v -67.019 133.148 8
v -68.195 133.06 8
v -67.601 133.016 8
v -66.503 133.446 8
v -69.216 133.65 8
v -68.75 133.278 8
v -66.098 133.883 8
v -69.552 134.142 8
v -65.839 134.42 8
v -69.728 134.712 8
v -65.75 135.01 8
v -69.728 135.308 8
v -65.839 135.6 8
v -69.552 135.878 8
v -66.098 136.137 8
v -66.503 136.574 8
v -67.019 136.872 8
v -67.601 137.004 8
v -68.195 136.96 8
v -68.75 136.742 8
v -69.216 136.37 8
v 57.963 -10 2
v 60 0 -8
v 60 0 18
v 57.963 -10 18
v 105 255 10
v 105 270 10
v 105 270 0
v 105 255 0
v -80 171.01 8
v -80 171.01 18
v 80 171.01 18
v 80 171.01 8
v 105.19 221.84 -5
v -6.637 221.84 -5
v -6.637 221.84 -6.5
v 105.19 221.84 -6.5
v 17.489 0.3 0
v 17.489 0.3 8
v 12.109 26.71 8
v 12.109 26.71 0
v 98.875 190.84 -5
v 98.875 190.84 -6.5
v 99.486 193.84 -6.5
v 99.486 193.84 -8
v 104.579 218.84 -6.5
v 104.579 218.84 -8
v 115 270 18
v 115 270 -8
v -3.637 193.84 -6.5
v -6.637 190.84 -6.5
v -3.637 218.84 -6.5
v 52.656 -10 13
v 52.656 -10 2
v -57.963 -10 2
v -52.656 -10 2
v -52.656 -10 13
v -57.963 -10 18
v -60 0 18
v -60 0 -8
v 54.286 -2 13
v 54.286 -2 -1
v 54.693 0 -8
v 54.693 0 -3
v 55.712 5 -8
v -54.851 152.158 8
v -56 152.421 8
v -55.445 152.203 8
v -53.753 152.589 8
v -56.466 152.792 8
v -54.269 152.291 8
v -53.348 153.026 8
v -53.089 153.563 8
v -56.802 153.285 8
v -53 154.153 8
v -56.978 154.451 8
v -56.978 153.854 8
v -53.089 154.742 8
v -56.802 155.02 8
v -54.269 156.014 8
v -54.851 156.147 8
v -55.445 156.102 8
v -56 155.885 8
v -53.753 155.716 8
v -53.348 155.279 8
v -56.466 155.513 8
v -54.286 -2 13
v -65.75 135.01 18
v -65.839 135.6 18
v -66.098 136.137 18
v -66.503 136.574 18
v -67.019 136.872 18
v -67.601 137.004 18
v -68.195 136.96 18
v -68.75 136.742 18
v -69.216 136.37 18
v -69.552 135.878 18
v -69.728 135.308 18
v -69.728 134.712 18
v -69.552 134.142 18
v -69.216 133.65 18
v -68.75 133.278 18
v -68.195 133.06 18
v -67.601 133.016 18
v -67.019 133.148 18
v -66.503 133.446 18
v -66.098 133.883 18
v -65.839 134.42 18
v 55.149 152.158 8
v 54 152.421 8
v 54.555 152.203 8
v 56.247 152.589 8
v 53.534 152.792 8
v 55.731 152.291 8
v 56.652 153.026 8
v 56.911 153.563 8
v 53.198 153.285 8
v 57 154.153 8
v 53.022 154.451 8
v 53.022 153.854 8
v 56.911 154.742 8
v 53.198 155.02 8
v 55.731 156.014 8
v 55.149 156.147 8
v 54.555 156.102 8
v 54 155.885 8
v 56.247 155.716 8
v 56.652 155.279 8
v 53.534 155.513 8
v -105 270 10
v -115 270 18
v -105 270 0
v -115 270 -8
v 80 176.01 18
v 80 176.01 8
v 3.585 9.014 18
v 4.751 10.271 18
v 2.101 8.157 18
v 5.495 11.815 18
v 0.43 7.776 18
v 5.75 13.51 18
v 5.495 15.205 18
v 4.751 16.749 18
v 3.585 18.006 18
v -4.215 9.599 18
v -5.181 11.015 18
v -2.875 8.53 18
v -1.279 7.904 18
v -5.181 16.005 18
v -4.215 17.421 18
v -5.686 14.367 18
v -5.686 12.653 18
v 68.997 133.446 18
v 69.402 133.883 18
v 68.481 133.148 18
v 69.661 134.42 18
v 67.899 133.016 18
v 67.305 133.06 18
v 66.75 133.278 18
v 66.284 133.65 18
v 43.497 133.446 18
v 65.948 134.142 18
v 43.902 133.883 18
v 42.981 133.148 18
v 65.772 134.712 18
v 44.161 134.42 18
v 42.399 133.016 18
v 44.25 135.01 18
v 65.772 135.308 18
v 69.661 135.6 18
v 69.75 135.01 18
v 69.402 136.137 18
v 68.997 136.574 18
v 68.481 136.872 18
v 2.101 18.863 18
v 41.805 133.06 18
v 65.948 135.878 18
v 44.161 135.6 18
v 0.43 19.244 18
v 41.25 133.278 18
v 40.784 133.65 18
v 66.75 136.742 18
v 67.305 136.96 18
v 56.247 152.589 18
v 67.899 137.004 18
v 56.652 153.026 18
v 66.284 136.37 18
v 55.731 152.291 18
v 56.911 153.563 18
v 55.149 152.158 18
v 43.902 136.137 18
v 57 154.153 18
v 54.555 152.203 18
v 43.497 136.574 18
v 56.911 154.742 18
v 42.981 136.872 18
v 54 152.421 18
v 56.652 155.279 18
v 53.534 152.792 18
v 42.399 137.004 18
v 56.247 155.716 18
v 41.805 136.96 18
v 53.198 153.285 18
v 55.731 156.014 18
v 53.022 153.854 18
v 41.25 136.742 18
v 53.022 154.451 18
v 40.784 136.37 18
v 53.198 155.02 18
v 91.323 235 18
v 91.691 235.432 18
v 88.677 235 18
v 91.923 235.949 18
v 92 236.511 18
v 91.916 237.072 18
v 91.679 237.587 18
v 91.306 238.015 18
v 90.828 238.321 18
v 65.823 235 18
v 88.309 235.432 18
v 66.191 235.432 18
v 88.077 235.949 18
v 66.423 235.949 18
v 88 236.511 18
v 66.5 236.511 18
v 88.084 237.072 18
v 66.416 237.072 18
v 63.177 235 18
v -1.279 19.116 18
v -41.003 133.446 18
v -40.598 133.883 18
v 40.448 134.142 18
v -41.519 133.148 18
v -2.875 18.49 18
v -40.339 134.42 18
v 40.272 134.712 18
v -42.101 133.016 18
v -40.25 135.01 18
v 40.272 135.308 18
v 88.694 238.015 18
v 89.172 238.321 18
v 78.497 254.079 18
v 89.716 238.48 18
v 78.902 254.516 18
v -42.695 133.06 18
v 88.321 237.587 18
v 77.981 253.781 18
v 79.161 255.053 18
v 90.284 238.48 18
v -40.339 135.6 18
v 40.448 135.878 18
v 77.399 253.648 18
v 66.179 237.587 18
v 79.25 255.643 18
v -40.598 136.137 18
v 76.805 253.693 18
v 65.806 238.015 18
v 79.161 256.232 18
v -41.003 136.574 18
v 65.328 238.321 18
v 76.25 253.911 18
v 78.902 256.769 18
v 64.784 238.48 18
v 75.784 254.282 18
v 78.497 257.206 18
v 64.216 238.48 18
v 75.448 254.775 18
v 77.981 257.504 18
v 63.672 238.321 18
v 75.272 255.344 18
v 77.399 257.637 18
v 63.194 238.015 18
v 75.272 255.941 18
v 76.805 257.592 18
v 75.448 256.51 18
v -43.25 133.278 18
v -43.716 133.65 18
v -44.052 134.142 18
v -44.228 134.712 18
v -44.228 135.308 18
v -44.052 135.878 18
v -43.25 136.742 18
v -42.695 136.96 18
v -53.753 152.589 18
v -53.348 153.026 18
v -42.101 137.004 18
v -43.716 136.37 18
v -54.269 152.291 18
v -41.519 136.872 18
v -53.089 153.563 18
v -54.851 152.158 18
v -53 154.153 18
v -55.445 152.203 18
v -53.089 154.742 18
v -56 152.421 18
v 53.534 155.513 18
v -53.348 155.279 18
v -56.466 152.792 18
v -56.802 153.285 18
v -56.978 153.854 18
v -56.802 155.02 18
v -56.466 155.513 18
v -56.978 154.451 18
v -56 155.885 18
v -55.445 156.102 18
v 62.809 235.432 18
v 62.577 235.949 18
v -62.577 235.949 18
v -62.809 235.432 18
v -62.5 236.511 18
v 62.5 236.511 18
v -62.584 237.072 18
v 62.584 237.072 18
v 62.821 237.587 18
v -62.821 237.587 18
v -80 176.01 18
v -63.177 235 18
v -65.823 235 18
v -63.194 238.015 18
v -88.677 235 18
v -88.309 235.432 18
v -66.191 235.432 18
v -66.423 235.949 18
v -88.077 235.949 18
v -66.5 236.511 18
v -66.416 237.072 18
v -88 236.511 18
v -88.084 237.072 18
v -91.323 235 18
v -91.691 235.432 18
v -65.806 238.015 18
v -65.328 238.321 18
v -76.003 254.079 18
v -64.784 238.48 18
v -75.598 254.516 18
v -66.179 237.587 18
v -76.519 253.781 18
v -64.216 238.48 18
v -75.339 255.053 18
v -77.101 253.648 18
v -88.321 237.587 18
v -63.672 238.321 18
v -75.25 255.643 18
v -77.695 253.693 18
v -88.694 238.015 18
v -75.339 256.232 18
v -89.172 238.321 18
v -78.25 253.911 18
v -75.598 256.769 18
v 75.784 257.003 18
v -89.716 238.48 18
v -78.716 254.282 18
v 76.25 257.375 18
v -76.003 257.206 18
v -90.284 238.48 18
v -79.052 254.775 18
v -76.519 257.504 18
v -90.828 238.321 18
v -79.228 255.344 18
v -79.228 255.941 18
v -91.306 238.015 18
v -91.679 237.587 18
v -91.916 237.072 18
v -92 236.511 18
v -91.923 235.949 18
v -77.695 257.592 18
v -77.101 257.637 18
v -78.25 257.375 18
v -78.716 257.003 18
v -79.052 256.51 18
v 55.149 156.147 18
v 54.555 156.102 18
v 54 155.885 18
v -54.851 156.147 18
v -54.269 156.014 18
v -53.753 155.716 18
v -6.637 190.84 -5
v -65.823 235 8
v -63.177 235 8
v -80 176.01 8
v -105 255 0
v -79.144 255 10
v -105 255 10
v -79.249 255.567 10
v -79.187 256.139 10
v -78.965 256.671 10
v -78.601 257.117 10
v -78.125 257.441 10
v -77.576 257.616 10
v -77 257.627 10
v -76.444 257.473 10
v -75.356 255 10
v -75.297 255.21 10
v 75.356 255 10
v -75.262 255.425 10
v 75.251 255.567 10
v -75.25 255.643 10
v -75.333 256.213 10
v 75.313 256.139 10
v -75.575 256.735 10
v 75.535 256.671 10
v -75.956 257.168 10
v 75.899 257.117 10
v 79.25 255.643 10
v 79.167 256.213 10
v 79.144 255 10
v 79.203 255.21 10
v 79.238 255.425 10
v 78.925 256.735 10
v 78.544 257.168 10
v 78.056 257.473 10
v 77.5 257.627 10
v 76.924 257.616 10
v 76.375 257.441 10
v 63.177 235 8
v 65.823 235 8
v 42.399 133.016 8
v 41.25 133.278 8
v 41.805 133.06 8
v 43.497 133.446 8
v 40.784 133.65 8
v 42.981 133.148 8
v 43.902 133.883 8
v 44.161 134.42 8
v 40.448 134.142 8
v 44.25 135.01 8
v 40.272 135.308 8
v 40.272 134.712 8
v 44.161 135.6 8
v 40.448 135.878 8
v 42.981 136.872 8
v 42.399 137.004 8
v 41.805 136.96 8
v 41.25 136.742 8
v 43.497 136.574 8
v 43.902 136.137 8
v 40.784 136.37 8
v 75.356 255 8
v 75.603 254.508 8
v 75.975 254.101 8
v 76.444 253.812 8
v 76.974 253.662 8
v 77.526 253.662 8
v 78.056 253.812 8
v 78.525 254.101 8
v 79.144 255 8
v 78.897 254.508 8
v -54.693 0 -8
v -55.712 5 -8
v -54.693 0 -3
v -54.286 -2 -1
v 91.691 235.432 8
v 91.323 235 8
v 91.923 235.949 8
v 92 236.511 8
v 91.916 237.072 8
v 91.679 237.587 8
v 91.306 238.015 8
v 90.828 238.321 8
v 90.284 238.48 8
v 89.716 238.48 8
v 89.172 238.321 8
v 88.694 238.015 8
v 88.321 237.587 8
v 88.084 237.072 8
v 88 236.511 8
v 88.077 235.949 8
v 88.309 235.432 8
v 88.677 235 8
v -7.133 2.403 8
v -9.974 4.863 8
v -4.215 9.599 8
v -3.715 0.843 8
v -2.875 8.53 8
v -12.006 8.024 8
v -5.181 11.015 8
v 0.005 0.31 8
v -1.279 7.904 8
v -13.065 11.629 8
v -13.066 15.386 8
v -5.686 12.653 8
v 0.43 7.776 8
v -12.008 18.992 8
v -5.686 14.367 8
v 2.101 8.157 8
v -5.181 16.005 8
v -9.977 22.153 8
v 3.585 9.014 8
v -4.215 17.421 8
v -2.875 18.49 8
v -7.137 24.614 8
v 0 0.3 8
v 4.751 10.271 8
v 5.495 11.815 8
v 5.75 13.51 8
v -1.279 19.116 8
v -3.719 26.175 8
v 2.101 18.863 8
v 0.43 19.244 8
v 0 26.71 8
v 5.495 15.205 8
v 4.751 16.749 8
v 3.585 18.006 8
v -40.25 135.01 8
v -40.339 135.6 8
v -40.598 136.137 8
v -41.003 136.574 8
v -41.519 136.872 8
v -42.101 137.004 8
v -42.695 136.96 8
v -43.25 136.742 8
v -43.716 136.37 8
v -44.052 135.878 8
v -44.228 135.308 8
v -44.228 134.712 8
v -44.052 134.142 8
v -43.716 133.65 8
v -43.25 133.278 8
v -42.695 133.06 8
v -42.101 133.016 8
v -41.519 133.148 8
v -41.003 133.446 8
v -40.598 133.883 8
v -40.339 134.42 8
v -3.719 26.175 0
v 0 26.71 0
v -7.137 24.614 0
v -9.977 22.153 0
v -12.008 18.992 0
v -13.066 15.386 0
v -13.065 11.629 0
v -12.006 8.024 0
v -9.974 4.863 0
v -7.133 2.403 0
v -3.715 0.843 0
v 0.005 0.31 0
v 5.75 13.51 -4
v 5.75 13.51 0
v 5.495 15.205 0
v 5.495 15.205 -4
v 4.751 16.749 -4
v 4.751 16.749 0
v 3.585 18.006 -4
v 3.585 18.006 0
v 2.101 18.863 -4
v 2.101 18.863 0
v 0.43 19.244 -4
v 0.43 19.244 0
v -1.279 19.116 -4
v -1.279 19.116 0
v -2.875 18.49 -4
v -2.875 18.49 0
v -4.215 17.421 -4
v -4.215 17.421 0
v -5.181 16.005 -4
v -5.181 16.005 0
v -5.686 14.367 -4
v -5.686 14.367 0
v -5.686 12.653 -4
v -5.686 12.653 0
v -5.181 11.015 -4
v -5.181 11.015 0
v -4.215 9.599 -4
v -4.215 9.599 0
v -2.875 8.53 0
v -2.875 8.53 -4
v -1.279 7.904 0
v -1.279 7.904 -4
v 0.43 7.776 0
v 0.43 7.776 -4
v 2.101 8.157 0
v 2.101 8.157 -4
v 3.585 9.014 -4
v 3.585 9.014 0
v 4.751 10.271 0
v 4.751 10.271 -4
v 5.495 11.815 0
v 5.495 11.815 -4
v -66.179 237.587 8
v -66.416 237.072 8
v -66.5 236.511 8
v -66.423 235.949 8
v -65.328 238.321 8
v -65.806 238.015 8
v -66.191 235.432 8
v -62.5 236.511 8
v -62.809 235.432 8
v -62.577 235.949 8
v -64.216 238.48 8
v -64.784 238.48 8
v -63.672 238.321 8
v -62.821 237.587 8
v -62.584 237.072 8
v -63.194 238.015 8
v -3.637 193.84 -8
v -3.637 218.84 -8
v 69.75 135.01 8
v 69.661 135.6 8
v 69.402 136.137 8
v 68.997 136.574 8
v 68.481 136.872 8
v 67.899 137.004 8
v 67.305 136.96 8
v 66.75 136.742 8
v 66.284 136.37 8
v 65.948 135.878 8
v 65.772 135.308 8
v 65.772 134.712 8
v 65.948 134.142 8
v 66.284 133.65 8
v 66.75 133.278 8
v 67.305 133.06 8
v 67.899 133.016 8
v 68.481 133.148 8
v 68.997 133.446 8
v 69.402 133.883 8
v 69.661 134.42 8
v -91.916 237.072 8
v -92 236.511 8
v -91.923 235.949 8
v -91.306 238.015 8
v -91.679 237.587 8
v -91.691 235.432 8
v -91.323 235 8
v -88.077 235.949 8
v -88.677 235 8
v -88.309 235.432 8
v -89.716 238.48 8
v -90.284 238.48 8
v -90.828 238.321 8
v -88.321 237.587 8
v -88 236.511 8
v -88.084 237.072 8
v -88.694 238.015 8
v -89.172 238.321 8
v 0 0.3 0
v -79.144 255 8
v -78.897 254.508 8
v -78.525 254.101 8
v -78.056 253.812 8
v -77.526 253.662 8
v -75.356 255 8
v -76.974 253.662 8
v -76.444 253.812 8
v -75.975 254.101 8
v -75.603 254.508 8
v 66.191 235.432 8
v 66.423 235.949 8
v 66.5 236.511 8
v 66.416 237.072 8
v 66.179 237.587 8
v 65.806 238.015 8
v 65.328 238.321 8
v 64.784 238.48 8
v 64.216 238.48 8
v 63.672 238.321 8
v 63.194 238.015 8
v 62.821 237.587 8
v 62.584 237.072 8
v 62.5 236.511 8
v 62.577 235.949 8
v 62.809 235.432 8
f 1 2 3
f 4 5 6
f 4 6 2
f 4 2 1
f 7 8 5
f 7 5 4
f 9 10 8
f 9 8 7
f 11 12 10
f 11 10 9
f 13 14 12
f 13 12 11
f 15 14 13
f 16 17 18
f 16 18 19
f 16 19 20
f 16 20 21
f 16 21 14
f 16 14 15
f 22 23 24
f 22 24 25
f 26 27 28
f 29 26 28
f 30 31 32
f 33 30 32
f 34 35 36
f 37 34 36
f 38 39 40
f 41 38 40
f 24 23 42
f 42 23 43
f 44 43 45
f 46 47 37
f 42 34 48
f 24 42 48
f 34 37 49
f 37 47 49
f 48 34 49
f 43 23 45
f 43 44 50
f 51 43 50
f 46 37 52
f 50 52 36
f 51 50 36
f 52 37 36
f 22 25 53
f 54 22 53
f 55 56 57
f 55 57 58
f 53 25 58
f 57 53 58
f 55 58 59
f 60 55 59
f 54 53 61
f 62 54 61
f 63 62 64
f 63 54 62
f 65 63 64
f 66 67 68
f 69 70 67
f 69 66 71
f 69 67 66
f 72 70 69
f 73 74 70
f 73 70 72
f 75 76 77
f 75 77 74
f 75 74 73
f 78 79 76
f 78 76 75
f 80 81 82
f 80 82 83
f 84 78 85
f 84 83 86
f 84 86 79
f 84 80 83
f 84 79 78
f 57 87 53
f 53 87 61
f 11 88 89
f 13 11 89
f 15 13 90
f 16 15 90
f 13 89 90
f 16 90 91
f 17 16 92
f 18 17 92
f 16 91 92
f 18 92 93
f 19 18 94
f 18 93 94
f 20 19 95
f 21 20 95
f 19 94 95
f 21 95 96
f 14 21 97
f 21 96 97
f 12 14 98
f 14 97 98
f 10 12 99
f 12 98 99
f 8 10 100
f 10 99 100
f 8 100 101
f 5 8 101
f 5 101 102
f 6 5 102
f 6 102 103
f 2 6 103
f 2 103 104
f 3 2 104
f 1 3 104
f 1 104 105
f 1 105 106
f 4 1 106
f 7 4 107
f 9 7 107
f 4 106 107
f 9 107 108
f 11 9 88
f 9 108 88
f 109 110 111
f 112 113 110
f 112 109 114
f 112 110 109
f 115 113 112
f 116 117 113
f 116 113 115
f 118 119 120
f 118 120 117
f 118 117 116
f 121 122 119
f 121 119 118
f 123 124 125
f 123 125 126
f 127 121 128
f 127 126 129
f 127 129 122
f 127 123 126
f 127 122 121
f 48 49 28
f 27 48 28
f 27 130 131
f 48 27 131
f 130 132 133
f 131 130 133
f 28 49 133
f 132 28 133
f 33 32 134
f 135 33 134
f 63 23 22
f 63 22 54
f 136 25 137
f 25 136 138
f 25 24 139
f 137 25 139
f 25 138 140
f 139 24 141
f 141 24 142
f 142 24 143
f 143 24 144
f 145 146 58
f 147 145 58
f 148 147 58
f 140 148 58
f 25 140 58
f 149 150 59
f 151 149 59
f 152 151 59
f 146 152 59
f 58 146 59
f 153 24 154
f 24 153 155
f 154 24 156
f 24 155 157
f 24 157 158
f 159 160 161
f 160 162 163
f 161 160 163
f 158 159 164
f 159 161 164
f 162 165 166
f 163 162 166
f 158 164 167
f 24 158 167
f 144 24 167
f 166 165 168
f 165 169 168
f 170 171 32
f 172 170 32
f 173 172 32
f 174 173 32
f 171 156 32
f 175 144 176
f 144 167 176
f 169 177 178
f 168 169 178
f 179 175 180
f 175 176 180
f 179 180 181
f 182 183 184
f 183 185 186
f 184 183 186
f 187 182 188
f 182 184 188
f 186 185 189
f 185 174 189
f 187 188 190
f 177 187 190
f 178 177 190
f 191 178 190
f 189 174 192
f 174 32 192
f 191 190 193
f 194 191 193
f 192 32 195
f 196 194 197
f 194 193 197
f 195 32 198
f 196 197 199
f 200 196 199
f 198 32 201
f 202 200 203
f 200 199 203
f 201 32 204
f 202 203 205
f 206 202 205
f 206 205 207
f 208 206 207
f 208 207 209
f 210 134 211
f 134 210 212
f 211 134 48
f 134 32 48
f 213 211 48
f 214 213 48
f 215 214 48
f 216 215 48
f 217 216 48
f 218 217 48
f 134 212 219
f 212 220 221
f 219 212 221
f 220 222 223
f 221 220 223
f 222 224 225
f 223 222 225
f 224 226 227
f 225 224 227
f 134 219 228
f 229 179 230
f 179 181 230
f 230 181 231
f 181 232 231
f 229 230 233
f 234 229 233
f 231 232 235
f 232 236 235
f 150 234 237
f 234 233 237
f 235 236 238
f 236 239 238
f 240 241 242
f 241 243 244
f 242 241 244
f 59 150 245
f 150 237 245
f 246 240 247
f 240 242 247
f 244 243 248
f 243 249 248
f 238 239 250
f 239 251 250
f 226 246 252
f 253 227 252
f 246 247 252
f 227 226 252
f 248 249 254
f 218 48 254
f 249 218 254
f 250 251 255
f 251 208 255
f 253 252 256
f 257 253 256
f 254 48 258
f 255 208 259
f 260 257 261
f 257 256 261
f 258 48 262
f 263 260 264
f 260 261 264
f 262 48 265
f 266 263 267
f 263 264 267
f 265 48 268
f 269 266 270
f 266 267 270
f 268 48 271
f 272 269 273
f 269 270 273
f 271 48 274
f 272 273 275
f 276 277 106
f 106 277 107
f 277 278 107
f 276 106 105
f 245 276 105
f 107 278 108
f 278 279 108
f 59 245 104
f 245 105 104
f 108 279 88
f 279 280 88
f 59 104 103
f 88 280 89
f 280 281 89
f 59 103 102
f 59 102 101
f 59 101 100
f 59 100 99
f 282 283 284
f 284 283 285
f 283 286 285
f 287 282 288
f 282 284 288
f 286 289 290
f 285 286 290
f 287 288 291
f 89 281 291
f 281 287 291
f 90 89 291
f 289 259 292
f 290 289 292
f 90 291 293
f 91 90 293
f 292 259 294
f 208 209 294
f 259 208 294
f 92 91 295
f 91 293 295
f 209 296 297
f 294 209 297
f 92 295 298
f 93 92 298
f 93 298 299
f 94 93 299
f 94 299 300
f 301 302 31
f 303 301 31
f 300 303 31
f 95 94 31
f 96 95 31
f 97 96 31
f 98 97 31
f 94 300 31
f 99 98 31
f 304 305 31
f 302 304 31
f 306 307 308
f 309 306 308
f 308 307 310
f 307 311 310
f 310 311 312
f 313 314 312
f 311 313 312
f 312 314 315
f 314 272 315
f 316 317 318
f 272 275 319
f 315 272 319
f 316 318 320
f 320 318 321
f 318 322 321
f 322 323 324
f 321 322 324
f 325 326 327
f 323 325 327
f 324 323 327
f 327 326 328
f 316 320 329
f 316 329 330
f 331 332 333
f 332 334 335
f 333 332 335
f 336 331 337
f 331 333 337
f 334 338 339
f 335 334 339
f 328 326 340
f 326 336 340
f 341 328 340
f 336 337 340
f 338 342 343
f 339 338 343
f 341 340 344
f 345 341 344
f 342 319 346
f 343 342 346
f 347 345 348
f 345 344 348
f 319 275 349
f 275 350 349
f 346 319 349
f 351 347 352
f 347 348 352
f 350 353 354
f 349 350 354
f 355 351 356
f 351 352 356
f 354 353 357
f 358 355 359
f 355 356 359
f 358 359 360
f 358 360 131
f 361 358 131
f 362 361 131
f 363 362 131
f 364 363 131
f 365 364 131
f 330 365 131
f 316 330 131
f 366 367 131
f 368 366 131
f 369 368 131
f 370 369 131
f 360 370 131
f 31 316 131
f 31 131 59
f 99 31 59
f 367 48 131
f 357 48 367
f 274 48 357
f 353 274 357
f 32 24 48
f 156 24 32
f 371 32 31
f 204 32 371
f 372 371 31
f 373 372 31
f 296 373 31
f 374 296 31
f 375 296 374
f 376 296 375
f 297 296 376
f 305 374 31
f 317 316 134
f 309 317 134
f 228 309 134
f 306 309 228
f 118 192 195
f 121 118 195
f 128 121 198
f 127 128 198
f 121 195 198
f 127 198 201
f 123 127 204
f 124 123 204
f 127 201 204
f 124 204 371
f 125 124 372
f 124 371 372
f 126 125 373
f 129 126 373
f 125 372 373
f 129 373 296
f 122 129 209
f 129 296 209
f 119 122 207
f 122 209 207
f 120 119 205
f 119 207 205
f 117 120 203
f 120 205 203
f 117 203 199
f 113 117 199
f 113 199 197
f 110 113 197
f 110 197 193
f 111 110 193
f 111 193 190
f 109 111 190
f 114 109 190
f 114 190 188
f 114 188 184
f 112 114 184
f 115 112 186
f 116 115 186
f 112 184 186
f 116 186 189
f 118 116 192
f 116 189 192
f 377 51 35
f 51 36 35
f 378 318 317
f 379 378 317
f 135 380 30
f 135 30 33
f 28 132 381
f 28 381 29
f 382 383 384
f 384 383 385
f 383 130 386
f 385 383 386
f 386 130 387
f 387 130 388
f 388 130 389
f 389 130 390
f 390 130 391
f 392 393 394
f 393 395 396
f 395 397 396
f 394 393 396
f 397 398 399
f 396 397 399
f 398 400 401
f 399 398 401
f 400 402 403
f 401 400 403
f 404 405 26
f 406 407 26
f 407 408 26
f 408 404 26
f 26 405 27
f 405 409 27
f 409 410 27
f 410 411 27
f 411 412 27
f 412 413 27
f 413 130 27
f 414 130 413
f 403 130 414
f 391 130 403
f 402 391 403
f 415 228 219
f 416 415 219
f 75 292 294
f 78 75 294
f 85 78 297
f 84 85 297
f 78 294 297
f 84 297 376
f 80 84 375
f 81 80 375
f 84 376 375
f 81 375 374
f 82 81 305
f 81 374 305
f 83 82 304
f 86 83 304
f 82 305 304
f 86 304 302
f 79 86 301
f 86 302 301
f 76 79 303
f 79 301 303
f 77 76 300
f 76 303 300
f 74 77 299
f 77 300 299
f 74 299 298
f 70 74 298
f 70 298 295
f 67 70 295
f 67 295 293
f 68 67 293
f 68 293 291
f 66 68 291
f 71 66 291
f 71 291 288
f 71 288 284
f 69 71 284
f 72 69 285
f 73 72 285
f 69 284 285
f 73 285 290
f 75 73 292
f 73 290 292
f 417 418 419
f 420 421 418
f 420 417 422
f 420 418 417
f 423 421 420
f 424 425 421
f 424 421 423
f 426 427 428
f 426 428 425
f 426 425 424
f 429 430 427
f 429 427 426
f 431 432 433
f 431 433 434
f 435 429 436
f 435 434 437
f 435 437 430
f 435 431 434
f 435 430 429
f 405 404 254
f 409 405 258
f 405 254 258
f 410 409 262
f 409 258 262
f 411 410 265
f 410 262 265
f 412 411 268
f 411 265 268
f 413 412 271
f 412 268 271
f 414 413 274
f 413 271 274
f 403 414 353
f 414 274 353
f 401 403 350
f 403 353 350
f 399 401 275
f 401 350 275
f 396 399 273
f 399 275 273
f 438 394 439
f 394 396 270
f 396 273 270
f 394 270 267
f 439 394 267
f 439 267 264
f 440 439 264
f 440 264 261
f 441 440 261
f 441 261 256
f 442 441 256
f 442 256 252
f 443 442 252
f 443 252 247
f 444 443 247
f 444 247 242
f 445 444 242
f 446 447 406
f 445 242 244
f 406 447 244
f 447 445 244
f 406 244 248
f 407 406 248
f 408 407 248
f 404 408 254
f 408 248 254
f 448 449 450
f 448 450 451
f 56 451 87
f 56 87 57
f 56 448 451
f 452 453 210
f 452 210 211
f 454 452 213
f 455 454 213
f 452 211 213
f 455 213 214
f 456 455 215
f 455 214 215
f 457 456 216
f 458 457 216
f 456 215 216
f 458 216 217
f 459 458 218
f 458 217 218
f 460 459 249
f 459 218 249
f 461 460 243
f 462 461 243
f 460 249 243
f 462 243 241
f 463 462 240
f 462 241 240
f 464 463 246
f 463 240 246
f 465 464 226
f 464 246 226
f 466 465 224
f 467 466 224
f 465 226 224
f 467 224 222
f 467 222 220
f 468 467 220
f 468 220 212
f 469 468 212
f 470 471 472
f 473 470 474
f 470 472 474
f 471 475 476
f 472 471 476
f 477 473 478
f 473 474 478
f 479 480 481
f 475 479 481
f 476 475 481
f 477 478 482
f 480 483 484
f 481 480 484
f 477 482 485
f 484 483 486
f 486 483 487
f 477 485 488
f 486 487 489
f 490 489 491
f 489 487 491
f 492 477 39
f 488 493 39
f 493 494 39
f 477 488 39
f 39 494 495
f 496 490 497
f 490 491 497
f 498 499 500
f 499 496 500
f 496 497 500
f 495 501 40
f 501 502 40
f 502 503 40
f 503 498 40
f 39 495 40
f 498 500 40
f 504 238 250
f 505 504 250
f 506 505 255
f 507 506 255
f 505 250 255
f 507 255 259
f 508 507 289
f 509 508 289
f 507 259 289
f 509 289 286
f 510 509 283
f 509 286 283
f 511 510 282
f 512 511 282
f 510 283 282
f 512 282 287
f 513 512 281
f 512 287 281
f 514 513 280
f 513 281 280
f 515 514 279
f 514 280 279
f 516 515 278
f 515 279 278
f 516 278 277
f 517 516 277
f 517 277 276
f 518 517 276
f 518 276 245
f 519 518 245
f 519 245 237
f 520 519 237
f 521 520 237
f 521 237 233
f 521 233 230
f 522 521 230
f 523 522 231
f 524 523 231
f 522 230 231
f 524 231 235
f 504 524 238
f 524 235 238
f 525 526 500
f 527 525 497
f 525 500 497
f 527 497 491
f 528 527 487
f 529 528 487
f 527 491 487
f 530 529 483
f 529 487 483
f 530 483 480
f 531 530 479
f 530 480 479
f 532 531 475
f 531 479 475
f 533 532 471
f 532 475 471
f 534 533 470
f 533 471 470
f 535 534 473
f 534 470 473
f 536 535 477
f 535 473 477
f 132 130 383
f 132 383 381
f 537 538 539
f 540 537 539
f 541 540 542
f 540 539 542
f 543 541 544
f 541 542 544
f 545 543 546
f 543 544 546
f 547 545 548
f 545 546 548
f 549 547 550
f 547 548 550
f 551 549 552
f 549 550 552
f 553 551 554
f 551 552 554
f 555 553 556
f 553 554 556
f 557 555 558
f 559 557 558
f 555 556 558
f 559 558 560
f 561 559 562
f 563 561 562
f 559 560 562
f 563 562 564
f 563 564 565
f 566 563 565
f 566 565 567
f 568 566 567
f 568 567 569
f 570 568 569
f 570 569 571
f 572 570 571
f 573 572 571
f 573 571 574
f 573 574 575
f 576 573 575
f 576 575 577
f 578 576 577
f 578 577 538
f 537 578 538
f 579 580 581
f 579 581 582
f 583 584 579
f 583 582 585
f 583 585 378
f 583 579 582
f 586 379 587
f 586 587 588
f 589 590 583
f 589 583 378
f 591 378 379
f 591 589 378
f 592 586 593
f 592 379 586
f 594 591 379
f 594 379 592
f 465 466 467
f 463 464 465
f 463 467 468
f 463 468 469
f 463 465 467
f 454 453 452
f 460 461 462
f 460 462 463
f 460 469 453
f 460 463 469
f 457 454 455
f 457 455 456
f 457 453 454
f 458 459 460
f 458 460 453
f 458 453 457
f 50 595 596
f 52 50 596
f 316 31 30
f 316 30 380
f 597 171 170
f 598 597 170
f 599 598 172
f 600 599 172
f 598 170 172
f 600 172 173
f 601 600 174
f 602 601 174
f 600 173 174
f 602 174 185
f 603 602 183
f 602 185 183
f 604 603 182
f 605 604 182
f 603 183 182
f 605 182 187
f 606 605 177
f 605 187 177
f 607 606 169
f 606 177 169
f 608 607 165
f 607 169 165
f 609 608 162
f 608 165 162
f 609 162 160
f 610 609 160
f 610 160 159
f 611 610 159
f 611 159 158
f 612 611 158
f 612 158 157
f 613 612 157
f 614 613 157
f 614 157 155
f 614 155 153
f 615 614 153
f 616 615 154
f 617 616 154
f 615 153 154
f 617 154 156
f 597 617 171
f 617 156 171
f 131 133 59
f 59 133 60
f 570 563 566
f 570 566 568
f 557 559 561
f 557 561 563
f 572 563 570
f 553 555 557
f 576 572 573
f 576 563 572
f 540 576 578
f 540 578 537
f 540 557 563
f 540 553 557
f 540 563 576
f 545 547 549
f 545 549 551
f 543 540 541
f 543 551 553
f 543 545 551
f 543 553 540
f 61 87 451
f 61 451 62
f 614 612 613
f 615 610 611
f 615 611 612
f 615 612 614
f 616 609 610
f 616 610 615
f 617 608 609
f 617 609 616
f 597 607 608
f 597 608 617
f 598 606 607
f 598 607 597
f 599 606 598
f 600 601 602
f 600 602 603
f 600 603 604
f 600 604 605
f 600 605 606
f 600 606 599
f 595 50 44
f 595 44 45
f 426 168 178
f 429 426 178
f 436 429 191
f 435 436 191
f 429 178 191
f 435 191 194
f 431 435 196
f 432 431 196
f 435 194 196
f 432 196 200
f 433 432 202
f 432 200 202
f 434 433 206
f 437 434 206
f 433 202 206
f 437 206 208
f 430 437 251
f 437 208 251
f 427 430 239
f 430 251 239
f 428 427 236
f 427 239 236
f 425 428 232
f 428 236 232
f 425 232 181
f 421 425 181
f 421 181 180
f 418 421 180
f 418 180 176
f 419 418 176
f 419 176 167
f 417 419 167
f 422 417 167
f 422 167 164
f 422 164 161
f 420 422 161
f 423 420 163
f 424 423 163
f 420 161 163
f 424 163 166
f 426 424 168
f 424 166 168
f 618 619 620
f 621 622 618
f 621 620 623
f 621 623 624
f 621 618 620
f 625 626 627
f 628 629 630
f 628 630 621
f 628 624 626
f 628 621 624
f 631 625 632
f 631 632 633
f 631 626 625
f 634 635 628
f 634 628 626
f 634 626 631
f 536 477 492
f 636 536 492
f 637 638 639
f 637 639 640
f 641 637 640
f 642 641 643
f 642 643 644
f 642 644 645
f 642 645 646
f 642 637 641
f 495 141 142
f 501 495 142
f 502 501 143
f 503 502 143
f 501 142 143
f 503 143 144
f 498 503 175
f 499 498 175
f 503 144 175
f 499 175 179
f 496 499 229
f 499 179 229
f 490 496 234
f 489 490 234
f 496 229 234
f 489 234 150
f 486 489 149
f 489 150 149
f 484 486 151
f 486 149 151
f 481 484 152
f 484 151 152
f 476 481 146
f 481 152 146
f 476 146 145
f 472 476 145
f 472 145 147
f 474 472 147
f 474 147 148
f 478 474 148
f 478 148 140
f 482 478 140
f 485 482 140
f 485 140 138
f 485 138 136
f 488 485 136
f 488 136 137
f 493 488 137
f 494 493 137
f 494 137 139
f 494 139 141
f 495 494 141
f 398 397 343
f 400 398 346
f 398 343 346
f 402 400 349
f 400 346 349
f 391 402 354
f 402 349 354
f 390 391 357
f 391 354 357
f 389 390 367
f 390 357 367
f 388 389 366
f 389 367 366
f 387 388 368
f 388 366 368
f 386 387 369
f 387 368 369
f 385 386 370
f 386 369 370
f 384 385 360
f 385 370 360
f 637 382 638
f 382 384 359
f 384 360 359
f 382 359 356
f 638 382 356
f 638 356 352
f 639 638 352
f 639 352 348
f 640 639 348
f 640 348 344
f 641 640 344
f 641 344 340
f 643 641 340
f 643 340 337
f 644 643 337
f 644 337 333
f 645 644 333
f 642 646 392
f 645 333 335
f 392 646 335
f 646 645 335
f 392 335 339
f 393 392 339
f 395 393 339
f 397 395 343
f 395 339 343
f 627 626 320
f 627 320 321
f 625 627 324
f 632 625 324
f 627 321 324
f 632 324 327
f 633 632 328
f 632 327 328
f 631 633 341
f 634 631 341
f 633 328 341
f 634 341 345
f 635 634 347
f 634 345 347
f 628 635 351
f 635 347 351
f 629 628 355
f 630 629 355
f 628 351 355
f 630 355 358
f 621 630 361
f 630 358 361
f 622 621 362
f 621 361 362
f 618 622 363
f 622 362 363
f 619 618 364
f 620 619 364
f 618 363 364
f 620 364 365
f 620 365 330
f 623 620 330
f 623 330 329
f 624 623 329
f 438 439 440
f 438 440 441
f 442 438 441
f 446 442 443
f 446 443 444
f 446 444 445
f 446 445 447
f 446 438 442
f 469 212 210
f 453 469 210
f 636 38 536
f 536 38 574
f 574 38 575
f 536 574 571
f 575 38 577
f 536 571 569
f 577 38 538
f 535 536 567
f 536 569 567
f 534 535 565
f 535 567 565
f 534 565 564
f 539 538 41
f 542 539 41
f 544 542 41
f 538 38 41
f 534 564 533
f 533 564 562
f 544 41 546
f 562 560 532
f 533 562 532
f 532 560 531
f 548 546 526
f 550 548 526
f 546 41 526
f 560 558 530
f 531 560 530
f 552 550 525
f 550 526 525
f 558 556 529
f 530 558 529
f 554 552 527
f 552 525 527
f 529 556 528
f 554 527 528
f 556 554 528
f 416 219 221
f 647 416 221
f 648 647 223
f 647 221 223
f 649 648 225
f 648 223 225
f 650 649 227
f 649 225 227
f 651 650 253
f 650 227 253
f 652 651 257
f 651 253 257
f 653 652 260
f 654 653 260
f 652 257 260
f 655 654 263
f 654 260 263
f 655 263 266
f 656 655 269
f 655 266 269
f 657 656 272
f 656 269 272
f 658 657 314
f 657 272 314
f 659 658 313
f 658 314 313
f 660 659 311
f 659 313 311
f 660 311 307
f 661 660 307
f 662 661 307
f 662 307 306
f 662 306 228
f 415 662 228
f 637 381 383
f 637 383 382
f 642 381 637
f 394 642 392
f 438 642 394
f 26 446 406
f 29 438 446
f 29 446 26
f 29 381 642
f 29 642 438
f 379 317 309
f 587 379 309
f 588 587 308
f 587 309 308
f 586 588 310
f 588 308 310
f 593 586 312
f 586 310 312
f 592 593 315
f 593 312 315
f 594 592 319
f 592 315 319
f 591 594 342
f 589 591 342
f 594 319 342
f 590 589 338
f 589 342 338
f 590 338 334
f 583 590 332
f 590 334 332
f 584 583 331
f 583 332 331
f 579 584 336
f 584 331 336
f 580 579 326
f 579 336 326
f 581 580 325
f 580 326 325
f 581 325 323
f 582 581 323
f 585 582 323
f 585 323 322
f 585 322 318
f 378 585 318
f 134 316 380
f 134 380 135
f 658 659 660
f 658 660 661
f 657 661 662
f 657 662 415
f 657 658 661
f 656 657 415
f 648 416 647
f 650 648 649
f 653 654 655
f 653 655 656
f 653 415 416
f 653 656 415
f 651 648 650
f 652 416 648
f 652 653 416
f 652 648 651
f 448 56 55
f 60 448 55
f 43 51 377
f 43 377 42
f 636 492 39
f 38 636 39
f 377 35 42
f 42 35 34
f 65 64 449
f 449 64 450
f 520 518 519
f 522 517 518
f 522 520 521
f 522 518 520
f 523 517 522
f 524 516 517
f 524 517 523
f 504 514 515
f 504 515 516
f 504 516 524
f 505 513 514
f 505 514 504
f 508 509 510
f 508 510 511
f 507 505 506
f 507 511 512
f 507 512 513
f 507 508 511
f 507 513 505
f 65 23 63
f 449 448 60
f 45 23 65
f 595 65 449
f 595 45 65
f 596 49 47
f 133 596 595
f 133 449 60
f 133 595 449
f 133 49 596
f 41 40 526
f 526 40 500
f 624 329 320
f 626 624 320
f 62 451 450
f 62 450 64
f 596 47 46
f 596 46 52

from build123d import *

# Parameters (mm, degrees)
EXTRUDE_1_DEPTH      = 8
CUT_EXTRUDE_1_DEPTH  = 8.6
EXTRUDE_2_DEPTH      = 8
EXTRUDE_3_DEPTH      = 10
SKETCH_7_R           = 5.75
CUT_EXTRUDE_2_DEPTH  = 22
EXTRUDE_5_DEPTH      = 26
CUT_EXTRUDE_4_DEPTH  = 21
CHAMFER_6_SIZE       = 5
CHAMFER_8_SIZE       = 10
SKETCH_13_W          = 210
SKETCH_13_H          = 10
CUT_EXTRUDE_5_DEPTH  = 15
SKETCH_14_W          = 160
SKETCH_14_H          = 5
CUT_EXTRUDE_6_DEPTH  = 10
SKETCH_16_R          = 2
CUT_EXTRUDE_7_DEPTH  = 10
SKETCH_18_W          = 109.386418102
SKETCH_18_H          = 16
EXTRUDE_7_DEPTH      = 2
CHAMFER_10_SIZE      = 2
SKETCH_32_W          = 100
SKETCH_32_H          = 25
CUT_EXTRUDE_16_DEPTH = 3
SKETCH_33_W          = 3
SKETCH_33_H          = 25
CUT_EXTRUDE_17_DEPTH = 1003
SKETCH_34_W          = 1.5
SKETCH_34_H          = 25
CUT_EXTRUDE_19_DEPTH = 3
SKETCH_36_W          = 111.215468024
SKETCH_36_H          = 1.5
CUT_EXTRUDE_20_DEPTH = 3
CUT_EXTRUDE_21_DEPTH = 3
SKETCH_38_W          = 1.5
SKETCH_38_H          = 31
CUT_EXTRUDE_22_DEPTH = 1003


with BuildPart() as part:
    # 草图1 → 凸台-拉伸1 (new body)
    with BuildSketch(Plane.XY):
        Polygon((-60, 0), (60, 0), (115, 270), (-115, 270), align=None)
    extrude(amount=EXTRUDE_1_DEPTH)

    # 草图2 → 切除-拉伸1 (cut)
    with BuildSketch(Plane.XY.offset(8)):
        with BuildLine():
            Line((0.005000474, 0.310000947), (0, 0.3))
            Line((0, 0.3), (17.48870838, 0.3))
            Line((17.48870838, 0.3), (12.108893566, 26.71))
            Line((12.108893566, 26.71), (0, 26.71))
            ThreePointArc((0, 26.71), (-13.199999763, 13.507499763), (0.005000474, 0.310000947))
        make_face()
    extrude(amount=-CUT_EXTRUDE_1_DEPTH, mode=Mode.SUBTRACT)

    # 草图5 → 凸台-拉伸2 (add)
    with BuildSketch(Plane(origin=(0, 0, 0), x_dir=(-1, 0, 0), z_dir=(0, 0, -1))):
        Polygon((60, 0), (115, 270), (-115, 270), (-60, 0), align=None)
    extrude(amount=EXTRUDE_2_DEPTH)

    # 草图6 → 凸台-拉伸3 (add)
    with BuildSketch(Plane.XY.offset(8)):
        Polygon((-115, 270), (-60, 0), (60, 0), (115, 270), align=None)
    extrude(amount=EXTRUDE_3_DEPTH)

    # 草图7 → 切除-拉伸2 (cut)
    with BuildSketch(Plane.XY.offset(18)):
        with Locations((0, 13.51)):
            Circle(SKETCH_7_R)
    extrude(amount=-CUT_EXTRUDE_2_DEPTH, mode=Mode.SUBTRACT)

    # 草图9 → 凸台-拉伸5 (add)
    with BuildSketch(Plane.XY.offset(18)):
        Polygon((-57.962962963, -10), (-60, 0), (60, 0), (57.962962963, -10), align=None)
    extrude(amount=-EXTRUDE_5_DEPTH)

    # 草图12 → 切除-拉伸4 (cut)
    with BuildSketch(Plane.XY.offset(-8)):
        Polygon((54.693209051, 0), (-54.693209051, 0), (-52.656172014, -10), (52.656172014, -10), align=None)
    extrude(amount=CUT_EXTRUDE_4_DEPTH, mode=Mode.SUBTRACT)

    # 倒角6
    chamfer_6_edges = [part.edges().sort_by_distance(p)[0] for p in [
        (0, 0, -8),
    ]]
    chamfer(chamfer_6_edges, length=CHAMFER_6_SIZE)

    # 倒角8
    chamfer_8_edges = [part.edges().sort_by_distance(p)[0] for p in [
        (55.309567488, -10, -8),
        (-55.309567488, -10, -8),
    ]]
    chamfer(chamfer_8_edges, length=CHAMFER_8_SIZE)

    # 草图13 → 切除-拉伸5 (cut)
    with BuildSketch(Plane(origin=(0, 270, 0), x_dir=(1, 0, 0), z_dir=(0, 1, 0))):
        with Locations((0, -5)):
            Rectangle(SKETCH_13_W, SKETCH_13_H)
    extrude(amount=-CUT_EXTRUDE_5_DEPTH, mode=Mode.SUBTRACT)

    # 草图14 → 切除-拉伸6 (cut)
    with BuildSketch(Plane.XY.offset(18)):
        with Locations((0, 173.51)):
            Rectangle(SKETCH_14_W, SKETCH_14_H)
    extrude(amount=-CUT_EXTRUDE_6_DEPTH, mode=Mode.SUBTRACT)

    # 草图16 → 切除-拉伸7 (cut)
    with BuildSketch(Plane.XY.offset(18)):
        with BuildLine():
            ThreePointArc((-88.677124344, 235), (-90, 238.5), (-91.322875656, 235))
            Line((-91.322875656, 235), (-88.677124344, 235))
        make_face()
        with BuildLine():
            ThreePointArc((91.322875656, 235), (90, 238.5), (88.677124344, 235))
            Line((88.677124344, 235), (91.322875656, 235))
        make_face()
        with BuildLine():
            ThreePointArc((65.822875656, 235), (64.5, 238.5), (63.177124344, 235))
            Line((63.177124344, 235), (65.822875656, 235))
        make_face()
        with BuildLine():
            ThreePointArc((-63.177124344, 235), (-64.5, 238.5), (-65.822875656, 235))
            Line((-65.822875656, 235), (-63.177124344, 235))
        make_face()
        with Locations((-77.25, 255.6425573)):
            Circle(SKETCH_16_R)
        with Locations((77.25, 255.6425573)):
            Circle(SKETCH_16_R)
        with Locations((-55, 154.1525573)):
            Circle(SKETCH_16_R)
        with Locations((-67.75, 135.01)):
            Circle(SKETCH_16_R)
        with Locations((-42.25, 135.01)):
            Circle(SKETCH_16_R)
        with Locations((42.25, 135.01)):
            Circle(SKETCH_16_R)
        with Locations((67.75, 135.01)):
            Circle(SKETCH_16_R)
        with Locations((55, 154.1525573)):
            Circle(SKETCH_16_R)
    extrude(amount=-CUT_EXTRUDE_7_DEPTH, mode=Mode.SUBTRACT)

    # 草图18 → 凸台-拉伸7 (add)
    with BuildSketch(Plane.XZ):
        with Locations((0, 5)):
            Rectangle(SKETCH_18_W, SKETCH_18_H)
    extrude(amount=EXTRUDE_7_DEPTH)

    # 倒角10
    chamfer_10_edges = [part.edges().sort_by_distance(p)[0] for p in [
        (0, -2, -3),
    ]]
    chamfer(chamfer_10_edges, length=CHAMFER_10_SIZE - 0.0001)  # a hair under: the kernel refuses the full size

    # 草图32 → 切除-拉伸16 (cut)
    with BuildSketch(Plane(origin=(0, 0, -8), x_dir=(-1, 0, 0), z_dir=(0, 0, -1))):
        with Locations((-46.363148148, 206.34047939)):
            Rectangle(SKETCH_32_W, SKETCH_32_H)
    extrude(amount=-CUT_EXTRUDE_16_DEPTH, mode=Mode.SUBTRACT)

    # 草图33 → 切除-拉伸17 (cut)
    with BuildSketch(Plane(origin=(-3.636851852, 0, 0), x_dir=(0, 0, -1), z_dir=(1, 0, 0))):
        with Locations((6.5, 206.34047939)):
            Rectangle(SKETCH_33_W, SKETCH_33_H)
    extrude(amount=CUT_EXTRUDE_17_DEPTH, mode=Mode.SUBTRACT)

    # 草图34 → 切除-拉伸19 (cut)
    with BuildSketch(Plane(origin=(-3.636851852, 0, 0), x_dir=(0, 0, -1), z_dir=(1, 0, 0))):
        with Locations((5.75, 206.34047939)):
            Rectangle(SKETCH_34_W, SKETCH_34_H)
    extrude(amount=-CUT_EXTRUDE_19_DEPTH, mode=Mode.SUBTRACT)

    # 草图36 → 切除-拉伸20 (cut)
    with BuildSketch(Plane.XZ.offset(-218.84047939)):
        with Locations((48.97088216, -5.75)):
            Rectangle(SKETCH_36_W, SKETCH_36_H)
    extrude(amount=-CUT_EXTRUDE_20_DEPTH, mode=Mode.SUBTRACT)

    # 草图37 → 切除-拉伸21 (cut)
    with BuildSketch(Plane(origin=(0, 193.84047939, 0), x_dir=(1, 0, 0), z_dir=(0, 1, 0))):
        Polygon((-6.636851852, 6.5), (-6.636851852, 5), (99.486023579, 5), (99.486023579, 6.5), (-3.636851852, 6.5), align=None)
    extrude(amount=-CUT_EXTRUDE_21_DEPTH, mode=Mode.SUBTRACT)

    # 草图38 → 切除-拉伸22 (cut)
    with BuildSketch(Plane(origin=(-6.636851852, 0, 0), x_dir=(0, 0, -1), z_dir=(1, 0, 0))):
        with Locations((5.75, 206.34047939)):
            Rectangle(SKETCH_38_W, SKETCH_38_H)
    extrude(amount=CUT_EXTRUDE_22_DEPTH, mode=Mode.SUBTRACT)


solid = part.part
